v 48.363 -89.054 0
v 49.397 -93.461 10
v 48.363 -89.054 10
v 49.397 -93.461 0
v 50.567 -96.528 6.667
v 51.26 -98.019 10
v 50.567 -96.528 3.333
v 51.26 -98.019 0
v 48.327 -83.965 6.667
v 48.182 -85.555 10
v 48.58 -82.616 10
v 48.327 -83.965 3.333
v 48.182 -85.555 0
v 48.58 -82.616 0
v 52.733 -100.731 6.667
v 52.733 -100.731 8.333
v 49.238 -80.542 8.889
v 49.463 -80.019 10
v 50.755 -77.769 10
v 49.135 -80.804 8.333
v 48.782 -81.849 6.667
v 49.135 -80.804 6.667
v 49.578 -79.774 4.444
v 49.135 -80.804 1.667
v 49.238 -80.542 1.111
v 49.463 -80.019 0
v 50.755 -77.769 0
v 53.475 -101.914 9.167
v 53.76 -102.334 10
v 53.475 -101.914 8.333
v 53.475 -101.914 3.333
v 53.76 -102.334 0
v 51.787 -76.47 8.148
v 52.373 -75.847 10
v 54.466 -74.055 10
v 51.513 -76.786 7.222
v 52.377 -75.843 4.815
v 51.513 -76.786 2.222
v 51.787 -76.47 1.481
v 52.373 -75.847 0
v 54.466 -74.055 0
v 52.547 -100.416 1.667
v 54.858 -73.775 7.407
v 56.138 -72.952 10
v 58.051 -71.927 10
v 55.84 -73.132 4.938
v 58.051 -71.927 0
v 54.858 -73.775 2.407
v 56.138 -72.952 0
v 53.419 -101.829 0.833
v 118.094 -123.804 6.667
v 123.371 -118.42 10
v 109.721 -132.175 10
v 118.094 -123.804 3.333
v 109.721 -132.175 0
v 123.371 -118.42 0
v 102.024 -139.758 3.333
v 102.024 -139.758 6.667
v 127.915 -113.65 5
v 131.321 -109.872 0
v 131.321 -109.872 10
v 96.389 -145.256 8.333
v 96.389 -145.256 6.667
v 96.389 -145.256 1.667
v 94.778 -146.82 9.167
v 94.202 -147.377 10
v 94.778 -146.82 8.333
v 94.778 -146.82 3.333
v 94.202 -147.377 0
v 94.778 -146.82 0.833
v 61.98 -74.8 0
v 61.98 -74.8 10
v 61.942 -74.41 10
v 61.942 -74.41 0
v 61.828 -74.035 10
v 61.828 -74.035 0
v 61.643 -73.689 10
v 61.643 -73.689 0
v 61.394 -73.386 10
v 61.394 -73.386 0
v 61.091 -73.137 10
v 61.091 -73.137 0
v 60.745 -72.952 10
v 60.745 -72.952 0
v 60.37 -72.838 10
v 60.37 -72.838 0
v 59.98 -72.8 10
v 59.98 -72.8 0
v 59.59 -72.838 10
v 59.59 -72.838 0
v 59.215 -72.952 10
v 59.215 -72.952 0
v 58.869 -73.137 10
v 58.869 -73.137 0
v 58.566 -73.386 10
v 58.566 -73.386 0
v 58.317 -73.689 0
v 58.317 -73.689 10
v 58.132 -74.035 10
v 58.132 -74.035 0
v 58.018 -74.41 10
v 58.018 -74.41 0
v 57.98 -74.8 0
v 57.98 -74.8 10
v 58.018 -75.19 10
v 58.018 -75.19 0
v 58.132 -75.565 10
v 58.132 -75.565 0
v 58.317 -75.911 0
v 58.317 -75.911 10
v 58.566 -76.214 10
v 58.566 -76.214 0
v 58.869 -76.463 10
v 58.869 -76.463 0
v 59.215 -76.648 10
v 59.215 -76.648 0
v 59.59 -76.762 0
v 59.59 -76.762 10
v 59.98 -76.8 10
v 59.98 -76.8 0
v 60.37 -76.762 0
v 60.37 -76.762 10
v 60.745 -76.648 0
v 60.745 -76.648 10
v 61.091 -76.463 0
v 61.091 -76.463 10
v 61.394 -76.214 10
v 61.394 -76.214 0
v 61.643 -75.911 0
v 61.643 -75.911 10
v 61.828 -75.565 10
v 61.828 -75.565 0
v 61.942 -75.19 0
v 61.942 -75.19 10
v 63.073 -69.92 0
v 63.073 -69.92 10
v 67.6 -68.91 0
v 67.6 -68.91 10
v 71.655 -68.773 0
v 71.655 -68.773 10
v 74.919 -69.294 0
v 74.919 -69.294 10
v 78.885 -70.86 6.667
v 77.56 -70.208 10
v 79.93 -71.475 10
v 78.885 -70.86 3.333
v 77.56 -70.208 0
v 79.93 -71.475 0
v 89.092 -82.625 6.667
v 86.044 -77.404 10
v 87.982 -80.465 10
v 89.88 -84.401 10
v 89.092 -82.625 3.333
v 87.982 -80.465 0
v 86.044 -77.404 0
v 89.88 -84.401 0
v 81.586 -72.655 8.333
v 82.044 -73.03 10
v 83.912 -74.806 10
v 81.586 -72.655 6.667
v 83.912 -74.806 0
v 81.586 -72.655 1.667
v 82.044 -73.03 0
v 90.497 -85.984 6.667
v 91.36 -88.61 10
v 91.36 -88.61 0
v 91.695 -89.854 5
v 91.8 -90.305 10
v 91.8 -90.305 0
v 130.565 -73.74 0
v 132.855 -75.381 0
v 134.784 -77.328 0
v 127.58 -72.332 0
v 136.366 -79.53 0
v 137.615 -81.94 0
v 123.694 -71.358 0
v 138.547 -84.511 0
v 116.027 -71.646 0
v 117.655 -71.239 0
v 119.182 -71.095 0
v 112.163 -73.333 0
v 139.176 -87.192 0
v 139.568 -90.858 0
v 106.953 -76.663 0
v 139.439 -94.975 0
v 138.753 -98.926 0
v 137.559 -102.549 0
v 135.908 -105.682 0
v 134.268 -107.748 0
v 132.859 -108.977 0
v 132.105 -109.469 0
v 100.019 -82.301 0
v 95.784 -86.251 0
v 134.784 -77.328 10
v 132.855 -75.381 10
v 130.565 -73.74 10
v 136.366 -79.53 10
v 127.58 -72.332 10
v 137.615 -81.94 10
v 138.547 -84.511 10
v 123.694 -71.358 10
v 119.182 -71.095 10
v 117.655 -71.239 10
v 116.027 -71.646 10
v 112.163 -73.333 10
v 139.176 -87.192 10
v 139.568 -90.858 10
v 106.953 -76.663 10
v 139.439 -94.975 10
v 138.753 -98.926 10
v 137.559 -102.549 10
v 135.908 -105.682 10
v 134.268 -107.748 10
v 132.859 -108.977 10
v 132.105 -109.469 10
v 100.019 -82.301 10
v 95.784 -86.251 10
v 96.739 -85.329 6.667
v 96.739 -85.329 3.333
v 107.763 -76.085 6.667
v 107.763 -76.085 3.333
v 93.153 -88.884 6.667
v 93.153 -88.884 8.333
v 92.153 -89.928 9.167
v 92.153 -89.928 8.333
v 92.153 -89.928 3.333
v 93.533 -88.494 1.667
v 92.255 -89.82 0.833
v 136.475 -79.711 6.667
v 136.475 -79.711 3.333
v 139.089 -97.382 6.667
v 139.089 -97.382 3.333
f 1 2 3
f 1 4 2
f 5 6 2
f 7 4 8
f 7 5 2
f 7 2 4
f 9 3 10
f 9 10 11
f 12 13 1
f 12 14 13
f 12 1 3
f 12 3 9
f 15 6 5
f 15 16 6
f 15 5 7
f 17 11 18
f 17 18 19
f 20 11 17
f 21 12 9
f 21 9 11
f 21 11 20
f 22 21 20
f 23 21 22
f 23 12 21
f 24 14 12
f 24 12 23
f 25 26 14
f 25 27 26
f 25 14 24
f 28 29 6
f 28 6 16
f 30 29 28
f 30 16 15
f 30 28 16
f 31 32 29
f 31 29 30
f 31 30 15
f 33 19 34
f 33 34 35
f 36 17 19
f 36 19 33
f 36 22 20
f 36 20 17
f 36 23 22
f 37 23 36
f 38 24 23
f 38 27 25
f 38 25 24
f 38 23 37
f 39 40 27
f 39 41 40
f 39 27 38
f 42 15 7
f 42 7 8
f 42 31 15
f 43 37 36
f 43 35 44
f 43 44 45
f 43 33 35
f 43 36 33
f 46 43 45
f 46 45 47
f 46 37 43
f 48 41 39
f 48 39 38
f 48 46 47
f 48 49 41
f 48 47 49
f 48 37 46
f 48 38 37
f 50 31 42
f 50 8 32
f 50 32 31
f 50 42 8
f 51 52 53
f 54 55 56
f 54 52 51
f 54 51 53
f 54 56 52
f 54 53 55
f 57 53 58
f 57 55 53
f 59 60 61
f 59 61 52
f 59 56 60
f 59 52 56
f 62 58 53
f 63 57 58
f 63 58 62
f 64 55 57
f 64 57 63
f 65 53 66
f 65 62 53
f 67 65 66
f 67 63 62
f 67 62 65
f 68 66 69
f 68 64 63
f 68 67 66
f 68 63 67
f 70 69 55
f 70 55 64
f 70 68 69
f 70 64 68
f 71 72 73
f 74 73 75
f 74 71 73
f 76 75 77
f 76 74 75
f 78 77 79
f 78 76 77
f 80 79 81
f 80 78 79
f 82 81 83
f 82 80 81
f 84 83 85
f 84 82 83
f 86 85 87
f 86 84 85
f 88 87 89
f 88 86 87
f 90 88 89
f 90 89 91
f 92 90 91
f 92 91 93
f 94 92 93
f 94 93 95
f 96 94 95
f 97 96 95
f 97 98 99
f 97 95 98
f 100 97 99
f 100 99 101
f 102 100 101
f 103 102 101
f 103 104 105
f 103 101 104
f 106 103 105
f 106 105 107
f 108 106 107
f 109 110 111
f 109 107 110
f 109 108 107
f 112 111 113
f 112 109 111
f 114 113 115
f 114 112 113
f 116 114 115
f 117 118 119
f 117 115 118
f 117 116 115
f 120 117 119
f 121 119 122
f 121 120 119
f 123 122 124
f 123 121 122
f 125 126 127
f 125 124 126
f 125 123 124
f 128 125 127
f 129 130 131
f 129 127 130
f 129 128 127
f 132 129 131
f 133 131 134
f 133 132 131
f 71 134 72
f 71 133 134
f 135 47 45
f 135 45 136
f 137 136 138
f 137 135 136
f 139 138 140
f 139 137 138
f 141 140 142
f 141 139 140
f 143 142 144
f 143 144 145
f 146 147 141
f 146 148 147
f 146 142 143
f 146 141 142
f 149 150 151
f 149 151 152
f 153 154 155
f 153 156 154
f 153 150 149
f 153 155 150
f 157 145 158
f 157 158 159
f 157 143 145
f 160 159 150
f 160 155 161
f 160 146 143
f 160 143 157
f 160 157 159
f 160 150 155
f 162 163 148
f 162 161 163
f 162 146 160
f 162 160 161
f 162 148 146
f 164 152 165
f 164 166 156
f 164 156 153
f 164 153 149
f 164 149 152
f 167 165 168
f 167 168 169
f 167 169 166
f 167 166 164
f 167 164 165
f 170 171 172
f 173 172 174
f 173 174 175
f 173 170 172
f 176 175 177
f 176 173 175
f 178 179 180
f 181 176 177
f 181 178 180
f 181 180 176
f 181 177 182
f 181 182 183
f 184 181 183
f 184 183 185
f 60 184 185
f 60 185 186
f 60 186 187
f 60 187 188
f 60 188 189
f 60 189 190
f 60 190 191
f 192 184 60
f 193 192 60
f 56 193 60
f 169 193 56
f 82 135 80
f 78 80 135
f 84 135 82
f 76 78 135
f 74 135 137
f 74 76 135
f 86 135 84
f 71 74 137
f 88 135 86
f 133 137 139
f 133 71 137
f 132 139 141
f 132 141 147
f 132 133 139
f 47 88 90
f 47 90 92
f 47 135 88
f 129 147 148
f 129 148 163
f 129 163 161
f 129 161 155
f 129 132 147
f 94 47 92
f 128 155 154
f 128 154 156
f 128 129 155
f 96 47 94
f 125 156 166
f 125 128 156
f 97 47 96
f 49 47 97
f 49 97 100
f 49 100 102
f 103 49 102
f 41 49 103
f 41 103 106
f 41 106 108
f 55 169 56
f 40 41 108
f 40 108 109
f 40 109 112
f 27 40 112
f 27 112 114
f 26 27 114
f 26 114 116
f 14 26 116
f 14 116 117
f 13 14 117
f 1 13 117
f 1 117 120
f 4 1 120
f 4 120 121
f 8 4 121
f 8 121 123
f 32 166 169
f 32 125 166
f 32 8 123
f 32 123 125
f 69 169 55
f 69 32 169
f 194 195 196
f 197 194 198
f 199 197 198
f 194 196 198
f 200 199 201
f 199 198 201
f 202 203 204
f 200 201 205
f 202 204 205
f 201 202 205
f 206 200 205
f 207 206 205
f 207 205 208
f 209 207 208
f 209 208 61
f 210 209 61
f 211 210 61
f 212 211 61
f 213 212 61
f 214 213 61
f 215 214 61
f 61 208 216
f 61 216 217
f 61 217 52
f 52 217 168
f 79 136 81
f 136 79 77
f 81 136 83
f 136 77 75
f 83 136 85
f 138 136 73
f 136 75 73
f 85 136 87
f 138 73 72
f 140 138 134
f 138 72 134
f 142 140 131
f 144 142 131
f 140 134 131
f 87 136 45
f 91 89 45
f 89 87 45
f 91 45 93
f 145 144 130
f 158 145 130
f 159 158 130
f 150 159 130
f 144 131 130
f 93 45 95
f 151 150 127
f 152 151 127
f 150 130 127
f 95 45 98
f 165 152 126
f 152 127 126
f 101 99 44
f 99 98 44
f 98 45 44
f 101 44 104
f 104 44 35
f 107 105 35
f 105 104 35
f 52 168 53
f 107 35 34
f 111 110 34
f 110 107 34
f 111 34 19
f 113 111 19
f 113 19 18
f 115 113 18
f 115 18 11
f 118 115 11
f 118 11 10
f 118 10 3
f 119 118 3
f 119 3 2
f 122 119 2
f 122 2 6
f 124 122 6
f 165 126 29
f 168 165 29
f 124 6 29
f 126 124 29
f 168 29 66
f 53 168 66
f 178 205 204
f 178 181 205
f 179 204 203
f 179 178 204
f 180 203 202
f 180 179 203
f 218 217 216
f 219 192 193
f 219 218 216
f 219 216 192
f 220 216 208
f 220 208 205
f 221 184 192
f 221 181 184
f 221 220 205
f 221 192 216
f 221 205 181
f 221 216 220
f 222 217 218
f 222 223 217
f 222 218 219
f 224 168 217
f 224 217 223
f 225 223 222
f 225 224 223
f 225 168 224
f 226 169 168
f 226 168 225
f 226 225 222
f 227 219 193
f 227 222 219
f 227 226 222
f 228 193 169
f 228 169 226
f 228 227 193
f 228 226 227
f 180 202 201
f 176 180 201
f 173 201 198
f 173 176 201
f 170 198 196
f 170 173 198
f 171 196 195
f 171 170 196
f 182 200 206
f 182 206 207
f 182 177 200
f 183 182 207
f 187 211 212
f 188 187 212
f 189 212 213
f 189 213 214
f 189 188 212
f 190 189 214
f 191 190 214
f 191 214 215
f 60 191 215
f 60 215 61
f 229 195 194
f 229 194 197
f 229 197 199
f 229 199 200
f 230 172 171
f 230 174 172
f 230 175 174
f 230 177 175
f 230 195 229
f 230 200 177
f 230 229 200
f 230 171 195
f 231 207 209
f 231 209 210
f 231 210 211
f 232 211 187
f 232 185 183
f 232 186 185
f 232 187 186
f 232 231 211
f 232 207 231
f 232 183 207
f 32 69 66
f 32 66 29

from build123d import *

# Parameters (mm, degrees)
CYLINDER_R     = 2
CYLINDER_DEPTH = 12
EXTRUDE_DEPTH  = 10


with BuildPart() as cilindro:
    # Cylinder → Cylinder (new body)
    with BuildSketch(Plane(origin=(59.98, -74.8, 0), x_dir=(1, 0, 0), z_dir=(0, 0, 1))):
        Circle(CYLINDER_R)
    extrude(amount=CYLINDER_DEPTH)


with BuildPart() as cut:
    # path2246 → Extrude (new body)
    with BuildSketch(Plane(origin=(94.341844, -105.754461, 0), x_dir=(0, -1, 0), z_dir=(0, 0, -1))):
        with BuildLine():
            add(Edge.make_bspline(
                [(41.622189, 0.139513), (-3.420731, 40.581559)],
                knots=[0, 0, 60.534484, 60.534484], degree=1))
            add(Edge.make_bspline(
                [(-3.420731, 40.581559), (-3.420731, 40.581559), (-24.478139, 55.667165), (-33.827718, 36.291336)],
                knots=[0, 0, 0, 0, 1, 1, 1, 1], degree=3))
            add(Edge.make_bspline(
                [(-33.827718, 36.291336), (-46.948673, 9.099806), (-15.449255, 2.542274), (-15.449255, 2.542274)],
                knots=[0, 0, 0, 0, 1, 1, 1, 1], degree=3))
            add(Edge.make_bspline(
                [(-15.449255, 2.542274), (-15.449255, 2.542274), (-34.638948, -15.120666), (-34.659558, -24.840656)],
                knots=[0, 0, 0, 0, 1, 1, 1, 1], degree=3))
            add(Edge.make_bspline(
                [(-34.659558, -24.840656), (-35.31742, -50.902936), (-1.036181, -48.507456), (4.117339, -36.979596)],
                knots=[0, 0, 0, 0, 1, 1, 1, 1], degree=3))
            add(Edge.make_bspline(
                [(4.117339, -36.979596), (13.587039, -28.871746), (41.622189, 0.139513), (41.622189, 0.139513)],
                knots=[0, 0, 0, 0, 1, 1, 1, 1], degree=3))
        make_face()
    extrude(amount=-EXTRUDE_DEPTH)

    # Cut: cut Cilindro
    add(cilindro.part, mode=Mode.SUBTRACT)


solid = cut.part
